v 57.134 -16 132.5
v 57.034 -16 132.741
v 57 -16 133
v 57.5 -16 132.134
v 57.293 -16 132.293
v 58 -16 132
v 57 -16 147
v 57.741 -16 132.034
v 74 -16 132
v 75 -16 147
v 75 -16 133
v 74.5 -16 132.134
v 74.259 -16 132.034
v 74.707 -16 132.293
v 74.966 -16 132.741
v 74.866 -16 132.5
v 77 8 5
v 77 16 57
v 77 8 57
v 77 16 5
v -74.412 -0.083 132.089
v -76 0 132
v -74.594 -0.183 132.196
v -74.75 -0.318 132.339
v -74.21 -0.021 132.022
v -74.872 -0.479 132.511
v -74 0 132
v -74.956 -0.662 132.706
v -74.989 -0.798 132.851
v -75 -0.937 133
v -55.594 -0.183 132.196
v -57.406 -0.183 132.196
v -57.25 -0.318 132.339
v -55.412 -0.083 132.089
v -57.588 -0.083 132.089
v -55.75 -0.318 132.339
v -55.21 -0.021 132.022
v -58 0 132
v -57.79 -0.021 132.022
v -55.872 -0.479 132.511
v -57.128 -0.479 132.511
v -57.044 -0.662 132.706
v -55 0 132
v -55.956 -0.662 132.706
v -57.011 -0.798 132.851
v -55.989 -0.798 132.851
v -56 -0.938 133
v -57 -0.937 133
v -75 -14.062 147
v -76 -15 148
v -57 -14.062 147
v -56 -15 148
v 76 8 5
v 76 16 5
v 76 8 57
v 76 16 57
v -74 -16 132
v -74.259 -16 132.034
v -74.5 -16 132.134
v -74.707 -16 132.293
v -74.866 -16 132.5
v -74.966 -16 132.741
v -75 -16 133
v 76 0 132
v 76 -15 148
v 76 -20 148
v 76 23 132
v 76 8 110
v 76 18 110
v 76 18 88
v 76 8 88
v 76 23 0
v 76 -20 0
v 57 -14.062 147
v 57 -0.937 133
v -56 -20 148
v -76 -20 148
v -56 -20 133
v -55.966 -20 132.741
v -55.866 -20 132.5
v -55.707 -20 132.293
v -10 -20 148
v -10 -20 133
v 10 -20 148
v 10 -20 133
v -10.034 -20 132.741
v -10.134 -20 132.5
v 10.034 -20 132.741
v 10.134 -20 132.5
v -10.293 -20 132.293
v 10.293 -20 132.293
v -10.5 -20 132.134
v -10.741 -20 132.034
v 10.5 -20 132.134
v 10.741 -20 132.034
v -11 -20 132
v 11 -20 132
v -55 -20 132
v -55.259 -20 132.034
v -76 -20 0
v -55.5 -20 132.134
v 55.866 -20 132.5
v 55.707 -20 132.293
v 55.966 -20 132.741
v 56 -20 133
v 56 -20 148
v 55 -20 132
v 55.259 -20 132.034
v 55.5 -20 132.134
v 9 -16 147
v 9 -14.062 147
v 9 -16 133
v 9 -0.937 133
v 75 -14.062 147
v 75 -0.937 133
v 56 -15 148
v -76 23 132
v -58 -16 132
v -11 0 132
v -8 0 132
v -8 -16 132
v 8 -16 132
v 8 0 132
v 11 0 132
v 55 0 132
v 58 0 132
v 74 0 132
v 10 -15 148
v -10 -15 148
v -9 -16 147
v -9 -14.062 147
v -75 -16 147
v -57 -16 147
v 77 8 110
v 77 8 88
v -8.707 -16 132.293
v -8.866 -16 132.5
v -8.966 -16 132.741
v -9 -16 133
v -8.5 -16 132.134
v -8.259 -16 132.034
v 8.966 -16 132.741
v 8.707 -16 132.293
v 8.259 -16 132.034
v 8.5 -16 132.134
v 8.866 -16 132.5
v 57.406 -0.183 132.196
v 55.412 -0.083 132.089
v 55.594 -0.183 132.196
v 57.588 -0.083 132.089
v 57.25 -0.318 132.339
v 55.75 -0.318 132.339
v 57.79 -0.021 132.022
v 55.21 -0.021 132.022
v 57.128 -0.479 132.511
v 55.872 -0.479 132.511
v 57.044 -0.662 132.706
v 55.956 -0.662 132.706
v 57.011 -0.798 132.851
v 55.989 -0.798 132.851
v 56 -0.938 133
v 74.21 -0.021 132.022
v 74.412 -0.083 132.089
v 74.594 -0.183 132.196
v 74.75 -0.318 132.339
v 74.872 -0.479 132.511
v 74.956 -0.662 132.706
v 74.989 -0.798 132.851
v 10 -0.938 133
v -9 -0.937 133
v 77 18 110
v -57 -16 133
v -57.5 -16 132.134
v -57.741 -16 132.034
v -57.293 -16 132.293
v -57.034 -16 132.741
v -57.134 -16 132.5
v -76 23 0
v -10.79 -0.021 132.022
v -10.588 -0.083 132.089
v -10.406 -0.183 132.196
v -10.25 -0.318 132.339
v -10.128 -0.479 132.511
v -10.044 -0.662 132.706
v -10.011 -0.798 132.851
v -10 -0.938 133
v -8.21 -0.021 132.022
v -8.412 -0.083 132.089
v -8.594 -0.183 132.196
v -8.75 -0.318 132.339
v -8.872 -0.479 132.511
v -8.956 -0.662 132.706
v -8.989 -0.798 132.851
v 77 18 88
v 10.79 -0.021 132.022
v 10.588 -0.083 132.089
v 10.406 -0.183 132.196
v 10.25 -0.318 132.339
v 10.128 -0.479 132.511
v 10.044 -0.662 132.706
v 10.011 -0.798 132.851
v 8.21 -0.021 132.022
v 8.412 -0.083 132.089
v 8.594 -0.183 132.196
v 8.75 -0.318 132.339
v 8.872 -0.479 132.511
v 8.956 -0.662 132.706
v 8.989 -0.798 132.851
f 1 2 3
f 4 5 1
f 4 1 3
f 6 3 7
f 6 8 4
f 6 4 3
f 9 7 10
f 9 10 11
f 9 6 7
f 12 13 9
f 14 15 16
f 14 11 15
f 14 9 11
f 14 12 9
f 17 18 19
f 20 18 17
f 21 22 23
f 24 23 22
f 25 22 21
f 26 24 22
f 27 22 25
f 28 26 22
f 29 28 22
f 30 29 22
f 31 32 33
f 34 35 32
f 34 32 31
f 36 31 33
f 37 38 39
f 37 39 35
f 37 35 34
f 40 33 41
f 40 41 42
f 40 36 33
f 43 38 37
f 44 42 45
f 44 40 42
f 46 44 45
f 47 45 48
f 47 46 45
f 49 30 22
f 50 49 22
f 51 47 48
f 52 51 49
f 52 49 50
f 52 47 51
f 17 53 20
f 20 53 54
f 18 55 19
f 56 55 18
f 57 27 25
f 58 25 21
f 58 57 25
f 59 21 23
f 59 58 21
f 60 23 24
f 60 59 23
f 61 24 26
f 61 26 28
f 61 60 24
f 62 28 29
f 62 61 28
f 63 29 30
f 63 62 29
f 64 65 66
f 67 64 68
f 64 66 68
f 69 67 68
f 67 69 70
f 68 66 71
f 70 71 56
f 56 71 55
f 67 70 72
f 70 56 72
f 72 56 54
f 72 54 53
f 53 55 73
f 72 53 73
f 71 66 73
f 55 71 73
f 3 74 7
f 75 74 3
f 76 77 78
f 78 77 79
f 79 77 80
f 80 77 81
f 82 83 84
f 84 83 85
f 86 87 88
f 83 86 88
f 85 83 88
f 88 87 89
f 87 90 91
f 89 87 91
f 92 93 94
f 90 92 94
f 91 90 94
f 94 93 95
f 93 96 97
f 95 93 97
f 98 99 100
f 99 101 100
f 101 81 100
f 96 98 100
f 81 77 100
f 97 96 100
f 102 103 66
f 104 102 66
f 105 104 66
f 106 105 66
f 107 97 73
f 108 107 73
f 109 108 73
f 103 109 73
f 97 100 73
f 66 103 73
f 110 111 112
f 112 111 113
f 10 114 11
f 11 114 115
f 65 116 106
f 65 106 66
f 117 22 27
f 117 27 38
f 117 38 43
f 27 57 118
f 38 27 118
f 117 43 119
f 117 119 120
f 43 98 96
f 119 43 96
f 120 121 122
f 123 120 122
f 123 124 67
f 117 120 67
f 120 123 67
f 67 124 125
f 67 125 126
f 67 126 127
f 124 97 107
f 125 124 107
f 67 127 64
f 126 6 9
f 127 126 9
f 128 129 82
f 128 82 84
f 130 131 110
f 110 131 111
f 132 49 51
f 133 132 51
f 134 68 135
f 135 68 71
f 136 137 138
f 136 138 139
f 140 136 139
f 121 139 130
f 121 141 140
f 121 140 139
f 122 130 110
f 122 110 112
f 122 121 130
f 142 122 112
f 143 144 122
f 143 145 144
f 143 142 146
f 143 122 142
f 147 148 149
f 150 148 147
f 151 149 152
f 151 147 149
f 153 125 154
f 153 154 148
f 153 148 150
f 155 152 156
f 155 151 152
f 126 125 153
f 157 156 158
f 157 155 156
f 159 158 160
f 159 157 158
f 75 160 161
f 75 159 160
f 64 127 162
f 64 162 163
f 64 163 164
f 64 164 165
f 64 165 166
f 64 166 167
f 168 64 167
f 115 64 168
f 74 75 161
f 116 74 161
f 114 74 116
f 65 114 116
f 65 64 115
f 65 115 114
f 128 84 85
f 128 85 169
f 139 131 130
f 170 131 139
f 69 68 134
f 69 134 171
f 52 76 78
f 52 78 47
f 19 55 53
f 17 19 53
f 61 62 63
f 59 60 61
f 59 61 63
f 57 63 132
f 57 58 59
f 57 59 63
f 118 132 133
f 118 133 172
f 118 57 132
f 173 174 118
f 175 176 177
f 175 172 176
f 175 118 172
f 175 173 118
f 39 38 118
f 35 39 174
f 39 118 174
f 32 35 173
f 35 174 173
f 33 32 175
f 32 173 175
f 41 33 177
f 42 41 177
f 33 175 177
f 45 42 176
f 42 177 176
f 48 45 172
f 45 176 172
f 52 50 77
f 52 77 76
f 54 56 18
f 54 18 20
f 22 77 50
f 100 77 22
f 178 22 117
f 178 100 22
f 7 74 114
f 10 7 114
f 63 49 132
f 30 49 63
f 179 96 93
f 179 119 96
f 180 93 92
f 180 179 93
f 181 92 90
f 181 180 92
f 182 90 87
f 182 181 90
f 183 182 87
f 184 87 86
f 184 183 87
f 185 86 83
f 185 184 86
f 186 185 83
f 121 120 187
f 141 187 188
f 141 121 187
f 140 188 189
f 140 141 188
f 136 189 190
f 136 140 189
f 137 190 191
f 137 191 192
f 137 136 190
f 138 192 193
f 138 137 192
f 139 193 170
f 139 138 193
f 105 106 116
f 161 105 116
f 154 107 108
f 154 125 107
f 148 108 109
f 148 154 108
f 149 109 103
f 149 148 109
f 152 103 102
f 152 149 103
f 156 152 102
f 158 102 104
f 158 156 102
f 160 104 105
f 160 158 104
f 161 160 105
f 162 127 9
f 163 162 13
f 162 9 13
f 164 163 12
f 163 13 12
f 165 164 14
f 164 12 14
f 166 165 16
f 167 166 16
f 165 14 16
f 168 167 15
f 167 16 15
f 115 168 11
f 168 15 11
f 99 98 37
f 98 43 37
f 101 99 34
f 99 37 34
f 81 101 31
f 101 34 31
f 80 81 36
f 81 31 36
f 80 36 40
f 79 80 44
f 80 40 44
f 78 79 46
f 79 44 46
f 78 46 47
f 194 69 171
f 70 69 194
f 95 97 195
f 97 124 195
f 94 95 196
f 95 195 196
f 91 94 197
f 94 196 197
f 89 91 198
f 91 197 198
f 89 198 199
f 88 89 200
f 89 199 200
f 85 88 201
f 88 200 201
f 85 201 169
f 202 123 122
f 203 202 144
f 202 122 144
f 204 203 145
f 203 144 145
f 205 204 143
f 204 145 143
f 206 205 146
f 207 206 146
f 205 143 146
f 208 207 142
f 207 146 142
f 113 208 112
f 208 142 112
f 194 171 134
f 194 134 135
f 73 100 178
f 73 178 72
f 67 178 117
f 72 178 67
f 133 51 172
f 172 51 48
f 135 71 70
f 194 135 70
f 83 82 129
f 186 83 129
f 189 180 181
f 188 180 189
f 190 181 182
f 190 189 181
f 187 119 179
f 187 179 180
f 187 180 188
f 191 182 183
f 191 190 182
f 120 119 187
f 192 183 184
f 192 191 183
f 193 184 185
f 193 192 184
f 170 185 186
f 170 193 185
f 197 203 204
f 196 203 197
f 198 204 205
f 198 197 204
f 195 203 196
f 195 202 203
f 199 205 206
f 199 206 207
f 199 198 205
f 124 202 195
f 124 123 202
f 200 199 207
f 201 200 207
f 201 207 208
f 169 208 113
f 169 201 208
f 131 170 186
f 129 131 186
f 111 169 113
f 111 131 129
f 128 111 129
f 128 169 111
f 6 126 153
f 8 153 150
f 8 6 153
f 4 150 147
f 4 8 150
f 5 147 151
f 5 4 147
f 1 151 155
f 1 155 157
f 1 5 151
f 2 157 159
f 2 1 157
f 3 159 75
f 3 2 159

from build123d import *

# Parameters (mm, degrees)
SKETCH1_W           = 152
SKETCH1_H           = 40
BOSS_EXTRUDE1_DEPTH = 132
SKETCH2_W           = 152
SKETCH2_H           = 132
BOSS_EXTRUDE2_DEPTH = 3
SKETCH4_W           = 20
SKETCH4_H           = 20
BOSS_EXTRUDE3_DEPTH = 16
SKETCH7_W           = 18
SKETCH7_H           = 15
CUT_EXTRUDE1_DEPTH  = 16
CUT_EXTRUDE2_DEPTH  = 214.39400179
FILLET1_R           = 1
SKETCH9_W           = 22
SKETCH9_H           = 10
SKETCH9_W_2         = 52
SKETCH9_H_2         = 8
BOSS_EXTRUDE4_DEPTH = 1


with BuildPart() as part:
    # Sketch1 → Boss-Extrude1 (new body)
    with BuildSketch(Plane.XY):
        Rectangle(SKETCH1_W, SKETCH1_H)
    extrude(amount=BOSS_EXTRUDE1_DEPTH)

    # Sketch2 → Boss-Extrude2 (add)
    with BuildSketch(Plane(origin=(0, 20, 0), x_dir=(1, 0, 0), z_dir=(0, 1, 0))):
        with Locations((0, -66)):
            Rectangle(SKETCH2_W, SKETCH2_H)
    extrude(amount=BOSS_EXTRUDE2_DEPTH)

    # Sketch4 → Boss-Extrude3 (add)
    with BuildSketch(Plane.XY.offset(132)):
        with Locations((-66, -10)):
            Rectangle(SKETCH4_W, SKETCH4_H)
        with Locations((66, -10)):
            Rectangle(SKETCH4_W, SKETCH4_H)
        with Locations((0, -10)):
            Rectangle(SKETCH4_W, SKETCH4_H)
    extrude(amount=BOSS_EXTRUDE3_DEPTH)

    # Sketch7 → Cut-Extrude1 (cut)
    with BuildSketch(Plane(origin=(0, 0, 0), x_dir=(1, 0, 0), z_dir=(0, 1, 0))):
        with Locations((66, -139.5)):
            Rectangle(SKETCH7_W, SKETCH7_H)
        with Locations((0, -139.5)):
            Rectangle(SKETCH7_W, SKETCH7_H)
        with Locations((-66, -139.5)):
            Rectangle(SKETCH7_W, SKETCH7_H)
    extrude(amount=-CUT_EXTRUDE1_DEPTH, mode=Mode.SUBTRACT)

    # Sketch8 → Cut-Extrude2 (cut, through all)
    with BuildSketch(Plane(origin=(76, 0, 0), x_dir=(0, 0, -1), z_dir=(1, 0, 0))):
        Polygon((-132, 0), (-148, -15), (-148, 0), align=None)
    extrude(amount=-CUT_EXTRUDE2_DEPTH, mode=Mode.SUBTRACT)

    # Fillet1
    fillet1_edges = [part.edges().sort_by_distance(p)[0] for p in [
        (-56, -10, 132),
        (56, -10, 132),
        (-10, -10, 132),
        (10, -10, 132),
        (57, -8, 132),
        (75, -8, 132),
        (-9, -8, 132),
        (9, -8, 132),
        (-75, -8, 132),
        (-57, -8, 132),
    ]]
    fillet(fillet1_edges, radius=FILLET1_R)

    # Sketch9 → Boss-Extrude4 (add)
    with BuildSketch(Plane(origin=(76, 0, 0), x_dir=(0, 0, -1), z_dir=(1, 0, 0))):
        with Locations((-99, 13)):
            Rectangle(SKETCH9_W, SKETCH9_H)
        with Locations((-31, 12)):
            Rectangle(SKETCH9_W_2, SKETCH9_H_2)
    extrude(amount=BOSS_EXTRUDE4_DEPTH)


solid = part.part
